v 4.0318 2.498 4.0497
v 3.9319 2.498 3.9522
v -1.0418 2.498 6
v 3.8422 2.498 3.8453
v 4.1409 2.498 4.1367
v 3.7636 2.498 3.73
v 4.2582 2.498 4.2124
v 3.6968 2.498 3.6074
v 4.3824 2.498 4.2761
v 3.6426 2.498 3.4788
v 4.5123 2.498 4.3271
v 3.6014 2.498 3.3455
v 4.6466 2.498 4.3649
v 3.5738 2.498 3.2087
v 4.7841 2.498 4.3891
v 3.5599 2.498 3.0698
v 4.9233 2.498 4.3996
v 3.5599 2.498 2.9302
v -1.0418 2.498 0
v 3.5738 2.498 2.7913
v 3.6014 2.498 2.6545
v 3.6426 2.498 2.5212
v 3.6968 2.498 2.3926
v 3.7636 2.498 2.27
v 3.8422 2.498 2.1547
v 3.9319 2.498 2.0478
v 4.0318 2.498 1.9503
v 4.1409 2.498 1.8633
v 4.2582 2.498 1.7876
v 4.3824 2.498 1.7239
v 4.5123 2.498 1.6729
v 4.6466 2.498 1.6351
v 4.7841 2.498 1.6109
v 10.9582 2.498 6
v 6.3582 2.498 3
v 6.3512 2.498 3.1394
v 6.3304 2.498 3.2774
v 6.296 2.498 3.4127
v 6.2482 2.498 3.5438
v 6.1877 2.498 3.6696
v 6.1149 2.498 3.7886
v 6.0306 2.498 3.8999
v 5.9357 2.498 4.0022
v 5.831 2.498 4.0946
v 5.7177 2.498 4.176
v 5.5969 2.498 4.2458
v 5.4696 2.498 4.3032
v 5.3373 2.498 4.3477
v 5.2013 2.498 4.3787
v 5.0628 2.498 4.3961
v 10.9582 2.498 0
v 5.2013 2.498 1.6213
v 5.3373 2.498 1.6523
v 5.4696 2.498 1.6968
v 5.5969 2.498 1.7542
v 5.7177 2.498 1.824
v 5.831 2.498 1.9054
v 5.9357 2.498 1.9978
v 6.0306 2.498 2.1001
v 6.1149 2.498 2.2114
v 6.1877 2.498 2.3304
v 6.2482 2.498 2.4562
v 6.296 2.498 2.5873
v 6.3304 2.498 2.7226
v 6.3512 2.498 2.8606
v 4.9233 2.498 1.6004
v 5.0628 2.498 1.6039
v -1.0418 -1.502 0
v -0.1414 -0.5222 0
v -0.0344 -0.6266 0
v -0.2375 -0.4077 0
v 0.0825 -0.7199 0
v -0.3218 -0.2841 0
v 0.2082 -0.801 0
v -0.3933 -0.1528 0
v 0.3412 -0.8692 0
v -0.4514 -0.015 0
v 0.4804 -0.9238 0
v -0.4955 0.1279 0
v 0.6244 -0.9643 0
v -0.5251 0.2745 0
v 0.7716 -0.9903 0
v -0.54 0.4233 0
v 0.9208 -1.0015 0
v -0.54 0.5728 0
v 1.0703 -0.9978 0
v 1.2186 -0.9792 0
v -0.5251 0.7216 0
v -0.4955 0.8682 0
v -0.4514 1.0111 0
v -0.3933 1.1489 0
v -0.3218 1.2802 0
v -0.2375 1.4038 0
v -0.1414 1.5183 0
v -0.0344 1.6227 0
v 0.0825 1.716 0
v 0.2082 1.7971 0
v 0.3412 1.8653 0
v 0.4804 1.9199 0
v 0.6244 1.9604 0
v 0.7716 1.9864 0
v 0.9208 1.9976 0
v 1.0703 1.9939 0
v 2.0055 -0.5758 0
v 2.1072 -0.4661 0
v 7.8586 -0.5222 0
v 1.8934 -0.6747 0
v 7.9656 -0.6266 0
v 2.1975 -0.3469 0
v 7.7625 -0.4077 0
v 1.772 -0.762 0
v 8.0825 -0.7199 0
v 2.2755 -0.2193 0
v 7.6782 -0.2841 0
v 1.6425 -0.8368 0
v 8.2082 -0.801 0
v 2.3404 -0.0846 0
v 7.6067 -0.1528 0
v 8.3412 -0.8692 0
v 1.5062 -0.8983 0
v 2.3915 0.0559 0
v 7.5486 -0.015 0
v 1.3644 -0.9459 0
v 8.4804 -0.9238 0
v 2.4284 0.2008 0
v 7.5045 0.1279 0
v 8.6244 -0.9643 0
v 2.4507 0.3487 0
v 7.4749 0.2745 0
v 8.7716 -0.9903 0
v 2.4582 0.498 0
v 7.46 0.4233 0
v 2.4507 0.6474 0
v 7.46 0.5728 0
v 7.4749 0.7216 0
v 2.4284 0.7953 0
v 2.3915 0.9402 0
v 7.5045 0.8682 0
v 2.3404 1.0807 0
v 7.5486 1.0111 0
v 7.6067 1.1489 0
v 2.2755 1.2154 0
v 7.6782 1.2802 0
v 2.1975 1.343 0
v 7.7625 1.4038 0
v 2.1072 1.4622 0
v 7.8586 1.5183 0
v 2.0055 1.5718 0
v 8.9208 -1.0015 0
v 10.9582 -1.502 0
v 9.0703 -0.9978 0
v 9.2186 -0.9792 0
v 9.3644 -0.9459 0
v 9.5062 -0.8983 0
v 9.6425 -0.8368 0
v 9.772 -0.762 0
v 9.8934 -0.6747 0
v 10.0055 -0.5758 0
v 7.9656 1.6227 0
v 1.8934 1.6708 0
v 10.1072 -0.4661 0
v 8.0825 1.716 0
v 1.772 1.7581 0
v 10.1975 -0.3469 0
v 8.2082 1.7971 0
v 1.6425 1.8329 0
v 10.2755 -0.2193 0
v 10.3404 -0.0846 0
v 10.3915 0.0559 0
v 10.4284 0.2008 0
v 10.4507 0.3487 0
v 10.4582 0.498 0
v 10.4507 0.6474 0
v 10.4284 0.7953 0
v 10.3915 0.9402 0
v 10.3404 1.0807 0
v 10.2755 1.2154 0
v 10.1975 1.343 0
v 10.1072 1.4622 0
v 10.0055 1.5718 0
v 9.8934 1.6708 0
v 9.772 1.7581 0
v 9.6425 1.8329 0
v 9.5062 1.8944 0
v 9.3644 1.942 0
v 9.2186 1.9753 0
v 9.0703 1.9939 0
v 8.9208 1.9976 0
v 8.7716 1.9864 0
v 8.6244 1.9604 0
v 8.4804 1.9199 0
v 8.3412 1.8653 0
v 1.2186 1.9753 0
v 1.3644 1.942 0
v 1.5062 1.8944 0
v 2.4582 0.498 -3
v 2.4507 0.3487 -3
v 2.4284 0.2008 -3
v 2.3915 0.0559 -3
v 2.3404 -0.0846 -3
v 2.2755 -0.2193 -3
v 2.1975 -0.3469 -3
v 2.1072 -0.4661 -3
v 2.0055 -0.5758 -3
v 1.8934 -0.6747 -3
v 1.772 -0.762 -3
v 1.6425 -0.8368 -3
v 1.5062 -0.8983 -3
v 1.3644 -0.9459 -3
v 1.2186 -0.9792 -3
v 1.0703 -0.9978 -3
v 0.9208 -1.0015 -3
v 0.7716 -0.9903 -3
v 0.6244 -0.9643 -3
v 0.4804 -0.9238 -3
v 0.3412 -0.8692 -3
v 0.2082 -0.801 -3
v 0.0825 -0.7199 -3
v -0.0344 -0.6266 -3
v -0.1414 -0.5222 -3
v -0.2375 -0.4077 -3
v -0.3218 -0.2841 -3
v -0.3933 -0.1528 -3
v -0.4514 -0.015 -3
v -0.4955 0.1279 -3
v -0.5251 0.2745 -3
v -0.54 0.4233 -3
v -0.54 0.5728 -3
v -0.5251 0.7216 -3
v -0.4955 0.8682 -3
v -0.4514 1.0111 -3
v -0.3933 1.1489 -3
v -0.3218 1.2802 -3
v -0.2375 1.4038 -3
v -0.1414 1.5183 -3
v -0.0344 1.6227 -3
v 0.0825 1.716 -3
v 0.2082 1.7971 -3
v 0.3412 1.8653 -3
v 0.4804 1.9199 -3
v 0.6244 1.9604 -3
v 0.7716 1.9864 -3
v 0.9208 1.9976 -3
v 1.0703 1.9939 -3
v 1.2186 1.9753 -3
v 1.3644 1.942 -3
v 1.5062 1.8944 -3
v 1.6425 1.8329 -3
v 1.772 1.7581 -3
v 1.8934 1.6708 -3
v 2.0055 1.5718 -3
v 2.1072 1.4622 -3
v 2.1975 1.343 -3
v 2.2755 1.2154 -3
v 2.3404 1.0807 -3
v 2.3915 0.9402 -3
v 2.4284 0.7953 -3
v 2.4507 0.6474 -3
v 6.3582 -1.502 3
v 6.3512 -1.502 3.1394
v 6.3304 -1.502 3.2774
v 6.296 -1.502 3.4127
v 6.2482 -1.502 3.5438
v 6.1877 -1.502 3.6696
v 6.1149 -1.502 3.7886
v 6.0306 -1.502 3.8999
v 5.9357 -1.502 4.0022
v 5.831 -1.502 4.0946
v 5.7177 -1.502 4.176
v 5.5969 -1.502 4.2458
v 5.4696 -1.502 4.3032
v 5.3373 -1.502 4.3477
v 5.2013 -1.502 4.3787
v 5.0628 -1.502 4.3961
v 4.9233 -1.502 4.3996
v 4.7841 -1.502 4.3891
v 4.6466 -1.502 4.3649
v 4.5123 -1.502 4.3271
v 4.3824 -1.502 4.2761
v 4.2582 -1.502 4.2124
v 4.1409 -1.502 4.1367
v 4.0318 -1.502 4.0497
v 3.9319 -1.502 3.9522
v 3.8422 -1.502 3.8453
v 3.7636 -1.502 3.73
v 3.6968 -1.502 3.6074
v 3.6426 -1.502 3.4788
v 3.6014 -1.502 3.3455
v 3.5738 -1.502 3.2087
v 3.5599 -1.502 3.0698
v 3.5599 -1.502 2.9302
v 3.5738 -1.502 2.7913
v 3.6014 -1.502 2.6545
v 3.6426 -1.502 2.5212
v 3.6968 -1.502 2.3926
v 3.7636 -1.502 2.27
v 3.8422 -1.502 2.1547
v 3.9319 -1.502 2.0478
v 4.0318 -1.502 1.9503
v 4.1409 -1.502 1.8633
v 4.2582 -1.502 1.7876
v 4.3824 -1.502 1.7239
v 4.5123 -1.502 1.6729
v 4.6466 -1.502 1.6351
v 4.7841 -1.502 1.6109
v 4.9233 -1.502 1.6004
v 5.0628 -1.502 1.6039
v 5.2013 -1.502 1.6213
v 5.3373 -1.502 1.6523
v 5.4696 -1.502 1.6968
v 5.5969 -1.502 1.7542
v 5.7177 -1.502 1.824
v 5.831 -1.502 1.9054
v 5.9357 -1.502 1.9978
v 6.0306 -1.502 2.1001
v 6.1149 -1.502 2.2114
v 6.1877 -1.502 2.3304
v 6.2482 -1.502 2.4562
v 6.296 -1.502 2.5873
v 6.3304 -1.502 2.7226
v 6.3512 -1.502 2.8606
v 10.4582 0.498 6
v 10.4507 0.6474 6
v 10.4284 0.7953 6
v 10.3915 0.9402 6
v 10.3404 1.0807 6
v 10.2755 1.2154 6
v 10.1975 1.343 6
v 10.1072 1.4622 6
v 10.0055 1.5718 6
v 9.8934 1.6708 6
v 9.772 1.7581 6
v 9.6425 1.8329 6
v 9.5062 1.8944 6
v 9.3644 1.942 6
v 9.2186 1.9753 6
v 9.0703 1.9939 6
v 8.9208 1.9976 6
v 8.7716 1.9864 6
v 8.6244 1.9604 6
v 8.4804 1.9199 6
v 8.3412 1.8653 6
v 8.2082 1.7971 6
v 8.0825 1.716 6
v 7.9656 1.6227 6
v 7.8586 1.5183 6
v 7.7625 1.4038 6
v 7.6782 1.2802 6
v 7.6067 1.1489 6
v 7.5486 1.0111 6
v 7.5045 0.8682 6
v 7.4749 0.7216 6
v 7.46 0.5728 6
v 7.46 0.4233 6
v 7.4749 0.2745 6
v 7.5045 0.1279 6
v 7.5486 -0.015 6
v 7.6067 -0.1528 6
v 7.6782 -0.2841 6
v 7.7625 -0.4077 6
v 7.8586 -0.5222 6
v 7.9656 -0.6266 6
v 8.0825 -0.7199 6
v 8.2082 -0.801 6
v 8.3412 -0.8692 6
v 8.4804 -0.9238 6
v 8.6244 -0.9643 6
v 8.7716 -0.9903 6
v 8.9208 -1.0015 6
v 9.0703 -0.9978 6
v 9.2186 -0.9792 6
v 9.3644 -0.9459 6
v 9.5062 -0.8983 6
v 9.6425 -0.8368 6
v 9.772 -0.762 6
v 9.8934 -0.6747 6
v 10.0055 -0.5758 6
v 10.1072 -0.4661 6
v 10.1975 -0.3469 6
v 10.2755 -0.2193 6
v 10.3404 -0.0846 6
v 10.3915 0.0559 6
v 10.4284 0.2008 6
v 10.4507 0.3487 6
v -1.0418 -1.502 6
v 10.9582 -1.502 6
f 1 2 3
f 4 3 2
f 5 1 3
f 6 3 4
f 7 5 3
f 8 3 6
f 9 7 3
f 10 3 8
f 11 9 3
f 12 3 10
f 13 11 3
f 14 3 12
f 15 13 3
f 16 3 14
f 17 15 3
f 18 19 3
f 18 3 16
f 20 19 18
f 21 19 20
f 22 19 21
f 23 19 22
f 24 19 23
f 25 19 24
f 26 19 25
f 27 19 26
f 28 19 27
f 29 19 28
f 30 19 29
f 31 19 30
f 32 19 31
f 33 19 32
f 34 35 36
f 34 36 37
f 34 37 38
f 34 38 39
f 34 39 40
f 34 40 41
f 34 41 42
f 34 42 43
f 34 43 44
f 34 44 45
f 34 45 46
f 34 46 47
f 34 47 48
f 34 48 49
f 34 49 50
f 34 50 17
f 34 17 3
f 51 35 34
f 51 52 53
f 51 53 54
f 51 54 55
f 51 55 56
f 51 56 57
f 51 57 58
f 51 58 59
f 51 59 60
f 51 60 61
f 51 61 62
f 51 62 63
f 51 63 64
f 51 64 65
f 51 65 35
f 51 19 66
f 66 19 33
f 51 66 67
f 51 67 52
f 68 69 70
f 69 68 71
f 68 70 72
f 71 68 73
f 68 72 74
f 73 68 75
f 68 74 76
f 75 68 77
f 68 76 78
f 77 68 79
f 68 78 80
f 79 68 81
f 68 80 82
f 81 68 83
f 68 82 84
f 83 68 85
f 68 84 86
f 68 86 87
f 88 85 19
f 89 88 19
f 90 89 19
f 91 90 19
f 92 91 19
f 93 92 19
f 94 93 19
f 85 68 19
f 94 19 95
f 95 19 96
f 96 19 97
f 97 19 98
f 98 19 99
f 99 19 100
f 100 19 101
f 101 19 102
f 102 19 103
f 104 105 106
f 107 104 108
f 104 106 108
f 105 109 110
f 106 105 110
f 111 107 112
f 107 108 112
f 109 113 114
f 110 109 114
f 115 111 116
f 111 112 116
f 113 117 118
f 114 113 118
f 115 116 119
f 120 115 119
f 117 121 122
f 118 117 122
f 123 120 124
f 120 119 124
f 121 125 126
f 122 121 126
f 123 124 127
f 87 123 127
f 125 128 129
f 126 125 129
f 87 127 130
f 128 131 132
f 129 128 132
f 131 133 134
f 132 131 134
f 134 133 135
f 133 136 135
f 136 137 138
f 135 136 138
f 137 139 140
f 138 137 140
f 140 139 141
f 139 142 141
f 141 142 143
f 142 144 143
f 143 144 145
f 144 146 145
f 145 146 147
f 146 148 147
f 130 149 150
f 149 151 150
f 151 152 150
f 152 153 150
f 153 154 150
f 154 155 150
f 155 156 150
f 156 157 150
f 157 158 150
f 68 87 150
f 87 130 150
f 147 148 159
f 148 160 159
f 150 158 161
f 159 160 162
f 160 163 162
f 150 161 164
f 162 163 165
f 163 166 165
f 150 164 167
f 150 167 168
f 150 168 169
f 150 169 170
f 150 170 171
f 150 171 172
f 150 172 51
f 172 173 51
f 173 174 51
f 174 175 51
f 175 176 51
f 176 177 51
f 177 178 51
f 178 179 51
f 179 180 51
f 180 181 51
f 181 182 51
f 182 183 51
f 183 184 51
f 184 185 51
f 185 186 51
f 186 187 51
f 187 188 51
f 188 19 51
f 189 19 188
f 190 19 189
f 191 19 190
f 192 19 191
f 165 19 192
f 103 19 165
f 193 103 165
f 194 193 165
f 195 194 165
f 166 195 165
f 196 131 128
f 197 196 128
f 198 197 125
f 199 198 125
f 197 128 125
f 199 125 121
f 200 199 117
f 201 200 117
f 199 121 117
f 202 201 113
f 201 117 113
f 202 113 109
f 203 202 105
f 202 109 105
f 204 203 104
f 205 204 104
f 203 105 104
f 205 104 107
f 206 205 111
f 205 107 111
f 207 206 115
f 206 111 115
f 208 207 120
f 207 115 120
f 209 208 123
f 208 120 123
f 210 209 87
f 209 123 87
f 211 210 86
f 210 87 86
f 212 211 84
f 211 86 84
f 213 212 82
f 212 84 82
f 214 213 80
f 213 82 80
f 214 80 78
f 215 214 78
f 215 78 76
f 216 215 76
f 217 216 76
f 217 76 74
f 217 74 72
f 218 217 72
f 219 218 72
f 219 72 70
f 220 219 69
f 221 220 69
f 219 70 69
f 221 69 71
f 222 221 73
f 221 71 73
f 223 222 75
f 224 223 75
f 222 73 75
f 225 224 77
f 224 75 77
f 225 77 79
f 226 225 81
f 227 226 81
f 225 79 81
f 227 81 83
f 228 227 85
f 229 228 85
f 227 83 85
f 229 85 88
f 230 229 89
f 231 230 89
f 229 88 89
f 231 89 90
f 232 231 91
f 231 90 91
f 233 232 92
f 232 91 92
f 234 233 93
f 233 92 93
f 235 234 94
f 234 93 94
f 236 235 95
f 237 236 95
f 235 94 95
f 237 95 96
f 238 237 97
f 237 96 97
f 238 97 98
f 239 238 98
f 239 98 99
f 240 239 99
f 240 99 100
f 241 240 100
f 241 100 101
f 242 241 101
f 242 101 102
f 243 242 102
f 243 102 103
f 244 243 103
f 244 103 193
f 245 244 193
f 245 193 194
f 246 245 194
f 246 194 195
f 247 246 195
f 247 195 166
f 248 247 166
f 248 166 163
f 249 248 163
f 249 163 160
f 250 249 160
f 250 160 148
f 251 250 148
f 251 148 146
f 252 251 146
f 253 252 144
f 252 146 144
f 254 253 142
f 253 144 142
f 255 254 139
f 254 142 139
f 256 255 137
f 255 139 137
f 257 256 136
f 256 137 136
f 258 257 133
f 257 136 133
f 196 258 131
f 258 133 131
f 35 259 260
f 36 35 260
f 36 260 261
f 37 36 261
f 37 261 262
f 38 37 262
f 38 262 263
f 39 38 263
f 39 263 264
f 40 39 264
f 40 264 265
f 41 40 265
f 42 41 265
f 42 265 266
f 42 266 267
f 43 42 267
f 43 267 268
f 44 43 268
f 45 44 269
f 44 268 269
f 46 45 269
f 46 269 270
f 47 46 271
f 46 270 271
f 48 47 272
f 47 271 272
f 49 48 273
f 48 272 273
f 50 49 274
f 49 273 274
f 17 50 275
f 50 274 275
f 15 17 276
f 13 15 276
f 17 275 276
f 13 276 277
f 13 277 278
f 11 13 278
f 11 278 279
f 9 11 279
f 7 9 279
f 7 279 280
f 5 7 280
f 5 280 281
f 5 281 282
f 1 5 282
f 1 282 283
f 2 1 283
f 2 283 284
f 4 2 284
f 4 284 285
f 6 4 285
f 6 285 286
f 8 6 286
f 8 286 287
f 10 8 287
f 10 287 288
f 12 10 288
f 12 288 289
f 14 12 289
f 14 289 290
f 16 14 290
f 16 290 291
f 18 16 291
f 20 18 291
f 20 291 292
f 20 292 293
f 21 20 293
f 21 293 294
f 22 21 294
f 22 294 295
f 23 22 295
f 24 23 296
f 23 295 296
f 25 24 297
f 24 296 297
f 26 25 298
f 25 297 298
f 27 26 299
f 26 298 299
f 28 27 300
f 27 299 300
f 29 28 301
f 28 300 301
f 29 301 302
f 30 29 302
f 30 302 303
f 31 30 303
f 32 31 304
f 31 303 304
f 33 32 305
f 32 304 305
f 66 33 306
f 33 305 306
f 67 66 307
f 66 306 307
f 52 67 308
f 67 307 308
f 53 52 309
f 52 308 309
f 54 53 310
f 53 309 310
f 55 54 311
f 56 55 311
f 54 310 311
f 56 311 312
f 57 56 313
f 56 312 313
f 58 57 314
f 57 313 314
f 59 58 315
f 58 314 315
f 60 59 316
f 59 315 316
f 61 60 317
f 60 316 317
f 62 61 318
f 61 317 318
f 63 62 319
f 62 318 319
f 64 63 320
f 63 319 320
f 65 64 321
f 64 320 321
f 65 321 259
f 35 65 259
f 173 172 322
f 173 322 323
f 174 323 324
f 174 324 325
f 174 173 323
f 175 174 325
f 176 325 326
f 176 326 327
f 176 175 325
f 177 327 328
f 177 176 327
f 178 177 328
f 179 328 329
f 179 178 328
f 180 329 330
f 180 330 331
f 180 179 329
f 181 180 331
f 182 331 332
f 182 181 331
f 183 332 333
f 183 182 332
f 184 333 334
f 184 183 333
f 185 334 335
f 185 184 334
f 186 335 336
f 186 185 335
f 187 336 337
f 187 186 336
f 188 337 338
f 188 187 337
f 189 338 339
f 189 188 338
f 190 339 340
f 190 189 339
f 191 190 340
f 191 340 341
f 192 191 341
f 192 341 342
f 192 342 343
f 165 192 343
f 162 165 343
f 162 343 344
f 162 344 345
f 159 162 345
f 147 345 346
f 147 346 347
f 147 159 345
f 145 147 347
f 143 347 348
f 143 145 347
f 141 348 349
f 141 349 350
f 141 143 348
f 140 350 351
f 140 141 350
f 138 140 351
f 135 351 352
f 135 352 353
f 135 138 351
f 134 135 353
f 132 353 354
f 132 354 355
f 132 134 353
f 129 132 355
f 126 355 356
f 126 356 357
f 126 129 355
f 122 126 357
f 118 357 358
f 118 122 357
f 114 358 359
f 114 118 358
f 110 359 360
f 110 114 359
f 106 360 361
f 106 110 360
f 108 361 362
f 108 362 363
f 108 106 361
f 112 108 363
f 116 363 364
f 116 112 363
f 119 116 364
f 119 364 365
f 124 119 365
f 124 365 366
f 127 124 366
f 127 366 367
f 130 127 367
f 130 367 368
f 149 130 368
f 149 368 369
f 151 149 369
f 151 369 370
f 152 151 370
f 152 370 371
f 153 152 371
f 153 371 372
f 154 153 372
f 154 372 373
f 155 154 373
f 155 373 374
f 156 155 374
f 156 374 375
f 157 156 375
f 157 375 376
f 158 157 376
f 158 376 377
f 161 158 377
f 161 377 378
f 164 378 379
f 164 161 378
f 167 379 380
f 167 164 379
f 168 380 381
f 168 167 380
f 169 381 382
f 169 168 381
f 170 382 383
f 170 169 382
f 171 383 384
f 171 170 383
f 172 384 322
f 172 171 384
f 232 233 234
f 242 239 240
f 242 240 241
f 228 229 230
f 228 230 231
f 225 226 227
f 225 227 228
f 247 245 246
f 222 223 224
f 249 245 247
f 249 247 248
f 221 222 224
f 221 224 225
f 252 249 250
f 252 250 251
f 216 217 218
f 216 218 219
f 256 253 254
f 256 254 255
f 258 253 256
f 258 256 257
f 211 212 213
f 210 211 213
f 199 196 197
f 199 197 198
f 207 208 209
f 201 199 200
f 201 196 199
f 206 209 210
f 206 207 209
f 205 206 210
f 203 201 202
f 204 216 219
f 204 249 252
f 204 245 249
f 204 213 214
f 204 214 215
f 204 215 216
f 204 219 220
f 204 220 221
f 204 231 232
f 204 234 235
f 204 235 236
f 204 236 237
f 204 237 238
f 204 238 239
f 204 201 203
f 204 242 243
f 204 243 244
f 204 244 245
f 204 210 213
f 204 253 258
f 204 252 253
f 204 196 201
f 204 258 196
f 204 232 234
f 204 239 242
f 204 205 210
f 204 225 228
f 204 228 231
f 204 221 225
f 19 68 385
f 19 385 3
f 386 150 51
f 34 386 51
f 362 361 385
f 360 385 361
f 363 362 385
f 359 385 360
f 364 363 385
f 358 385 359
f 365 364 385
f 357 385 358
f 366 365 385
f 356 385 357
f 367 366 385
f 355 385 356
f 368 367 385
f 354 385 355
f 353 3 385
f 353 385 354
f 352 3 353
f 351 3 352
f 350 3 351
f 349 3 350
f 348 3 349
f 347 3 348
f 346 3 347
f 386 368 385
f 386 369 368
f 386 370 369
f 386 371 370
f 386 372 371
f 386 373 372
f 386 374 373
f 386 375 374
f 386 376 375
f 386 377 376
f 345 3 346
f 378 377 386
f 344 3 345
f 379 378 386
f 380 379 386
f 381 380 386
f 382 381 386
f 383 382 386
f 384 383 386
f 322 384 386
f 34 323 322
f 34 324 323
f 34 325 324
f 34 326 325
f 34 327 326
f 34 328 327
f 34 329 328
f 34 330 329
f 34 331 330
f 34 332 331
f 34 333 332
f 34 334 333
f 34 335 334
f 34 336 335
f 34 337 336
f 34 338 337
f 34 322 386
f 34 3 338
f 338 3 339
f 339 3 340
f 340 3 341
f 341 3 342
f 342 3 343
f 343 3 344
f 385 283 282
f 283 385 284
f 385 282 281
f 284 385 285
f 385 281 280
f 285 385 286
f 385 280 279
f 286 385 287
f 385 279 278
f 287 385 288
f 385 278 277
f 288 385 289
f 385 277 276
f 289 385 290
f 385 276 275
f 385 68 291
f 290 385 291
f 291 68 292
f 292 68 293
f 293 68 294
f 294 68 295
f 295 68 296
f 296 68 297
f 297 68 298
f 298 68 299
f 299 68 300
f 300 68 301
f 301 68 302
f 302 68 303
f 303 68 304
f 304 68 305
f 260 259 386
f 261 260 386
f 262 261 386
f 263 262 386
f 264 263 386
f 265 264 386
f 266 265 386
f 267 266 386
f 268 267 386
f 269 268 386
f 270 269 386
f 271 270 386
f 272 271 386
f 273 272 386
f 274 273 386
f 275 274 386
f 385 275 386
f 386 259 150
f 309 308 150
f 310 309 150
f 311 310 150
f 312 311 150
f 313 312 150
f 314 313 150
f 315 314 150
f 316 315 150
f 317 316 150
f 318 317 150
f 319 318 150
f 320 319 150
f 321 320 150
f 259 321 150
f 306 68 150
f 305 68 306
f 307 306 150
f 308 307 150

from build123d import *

# Parameters (mm, degrees)
SKETCH_1_W          = 12
SKETCH_1_H          = 4
SKETCH_1_R          = 1.5
EXTRUDE_1_DEPTH     = 6
SKETCH_2_R          = 1.5
EXTRUDE_2_DEPTH     = 3
CUT_EXTRUDE_1_REACH = 15.118
SKETCH_3_R          = 1.4


with BuildPart() as part:
    # Эскиз1 → Бобышка-Вытянуть1 (new body)
    with BuildSketch(Plane.XY):
        with Locations((4.958157727, 0.498048464)):
            Rectangle(SKETCH_1_W, SKETCH_1_H)
        with Locations((8.958157727, 0.498048464)):
            Circle(SKETCH_1_R, mode=Mode.SUBTRACT)
    extrude(amount=EXTRUDE_1_DEPTH)

    # Эскиз2 → Бобышка-Вытянуть2 (add)
    with BuildSketch(Plane(origin=(0, 0, 0), x_dir=(-1, 0, 0), z_dir=(0, 0, -1))):
        with Locations(Location((-0.958157727, 0.498048464, 0), (0, 0, 180))):
            Circle(SKETCH_2_R)
    extrude(amount=EXTRUDE_2_DEPTH)

    # Эскиз3 → Вырез-Вытянуть1 (cut, up to next)
    with BuildSketch(Plane.XZ.offset(1.501951536), mode=Mode.PRIVATE) as cut_extrude_1_sk1:
        with Locations((4.958157727, 3)):
            Circle(SKETCH_3_R)
    cut_extrude_1_tool1 = extrude(cut_extrude_1_sk1.sketch, amount=-CUT_EXTRUDE_1_REACH, mode=Mode.PRIVATE) & part.part
    add(cut_extrude_1_tool1.solids().sort_by_distance((4.958158, -1.501952, 3))[0], mode=Mode.SUBTRACT)


solid = part.part
